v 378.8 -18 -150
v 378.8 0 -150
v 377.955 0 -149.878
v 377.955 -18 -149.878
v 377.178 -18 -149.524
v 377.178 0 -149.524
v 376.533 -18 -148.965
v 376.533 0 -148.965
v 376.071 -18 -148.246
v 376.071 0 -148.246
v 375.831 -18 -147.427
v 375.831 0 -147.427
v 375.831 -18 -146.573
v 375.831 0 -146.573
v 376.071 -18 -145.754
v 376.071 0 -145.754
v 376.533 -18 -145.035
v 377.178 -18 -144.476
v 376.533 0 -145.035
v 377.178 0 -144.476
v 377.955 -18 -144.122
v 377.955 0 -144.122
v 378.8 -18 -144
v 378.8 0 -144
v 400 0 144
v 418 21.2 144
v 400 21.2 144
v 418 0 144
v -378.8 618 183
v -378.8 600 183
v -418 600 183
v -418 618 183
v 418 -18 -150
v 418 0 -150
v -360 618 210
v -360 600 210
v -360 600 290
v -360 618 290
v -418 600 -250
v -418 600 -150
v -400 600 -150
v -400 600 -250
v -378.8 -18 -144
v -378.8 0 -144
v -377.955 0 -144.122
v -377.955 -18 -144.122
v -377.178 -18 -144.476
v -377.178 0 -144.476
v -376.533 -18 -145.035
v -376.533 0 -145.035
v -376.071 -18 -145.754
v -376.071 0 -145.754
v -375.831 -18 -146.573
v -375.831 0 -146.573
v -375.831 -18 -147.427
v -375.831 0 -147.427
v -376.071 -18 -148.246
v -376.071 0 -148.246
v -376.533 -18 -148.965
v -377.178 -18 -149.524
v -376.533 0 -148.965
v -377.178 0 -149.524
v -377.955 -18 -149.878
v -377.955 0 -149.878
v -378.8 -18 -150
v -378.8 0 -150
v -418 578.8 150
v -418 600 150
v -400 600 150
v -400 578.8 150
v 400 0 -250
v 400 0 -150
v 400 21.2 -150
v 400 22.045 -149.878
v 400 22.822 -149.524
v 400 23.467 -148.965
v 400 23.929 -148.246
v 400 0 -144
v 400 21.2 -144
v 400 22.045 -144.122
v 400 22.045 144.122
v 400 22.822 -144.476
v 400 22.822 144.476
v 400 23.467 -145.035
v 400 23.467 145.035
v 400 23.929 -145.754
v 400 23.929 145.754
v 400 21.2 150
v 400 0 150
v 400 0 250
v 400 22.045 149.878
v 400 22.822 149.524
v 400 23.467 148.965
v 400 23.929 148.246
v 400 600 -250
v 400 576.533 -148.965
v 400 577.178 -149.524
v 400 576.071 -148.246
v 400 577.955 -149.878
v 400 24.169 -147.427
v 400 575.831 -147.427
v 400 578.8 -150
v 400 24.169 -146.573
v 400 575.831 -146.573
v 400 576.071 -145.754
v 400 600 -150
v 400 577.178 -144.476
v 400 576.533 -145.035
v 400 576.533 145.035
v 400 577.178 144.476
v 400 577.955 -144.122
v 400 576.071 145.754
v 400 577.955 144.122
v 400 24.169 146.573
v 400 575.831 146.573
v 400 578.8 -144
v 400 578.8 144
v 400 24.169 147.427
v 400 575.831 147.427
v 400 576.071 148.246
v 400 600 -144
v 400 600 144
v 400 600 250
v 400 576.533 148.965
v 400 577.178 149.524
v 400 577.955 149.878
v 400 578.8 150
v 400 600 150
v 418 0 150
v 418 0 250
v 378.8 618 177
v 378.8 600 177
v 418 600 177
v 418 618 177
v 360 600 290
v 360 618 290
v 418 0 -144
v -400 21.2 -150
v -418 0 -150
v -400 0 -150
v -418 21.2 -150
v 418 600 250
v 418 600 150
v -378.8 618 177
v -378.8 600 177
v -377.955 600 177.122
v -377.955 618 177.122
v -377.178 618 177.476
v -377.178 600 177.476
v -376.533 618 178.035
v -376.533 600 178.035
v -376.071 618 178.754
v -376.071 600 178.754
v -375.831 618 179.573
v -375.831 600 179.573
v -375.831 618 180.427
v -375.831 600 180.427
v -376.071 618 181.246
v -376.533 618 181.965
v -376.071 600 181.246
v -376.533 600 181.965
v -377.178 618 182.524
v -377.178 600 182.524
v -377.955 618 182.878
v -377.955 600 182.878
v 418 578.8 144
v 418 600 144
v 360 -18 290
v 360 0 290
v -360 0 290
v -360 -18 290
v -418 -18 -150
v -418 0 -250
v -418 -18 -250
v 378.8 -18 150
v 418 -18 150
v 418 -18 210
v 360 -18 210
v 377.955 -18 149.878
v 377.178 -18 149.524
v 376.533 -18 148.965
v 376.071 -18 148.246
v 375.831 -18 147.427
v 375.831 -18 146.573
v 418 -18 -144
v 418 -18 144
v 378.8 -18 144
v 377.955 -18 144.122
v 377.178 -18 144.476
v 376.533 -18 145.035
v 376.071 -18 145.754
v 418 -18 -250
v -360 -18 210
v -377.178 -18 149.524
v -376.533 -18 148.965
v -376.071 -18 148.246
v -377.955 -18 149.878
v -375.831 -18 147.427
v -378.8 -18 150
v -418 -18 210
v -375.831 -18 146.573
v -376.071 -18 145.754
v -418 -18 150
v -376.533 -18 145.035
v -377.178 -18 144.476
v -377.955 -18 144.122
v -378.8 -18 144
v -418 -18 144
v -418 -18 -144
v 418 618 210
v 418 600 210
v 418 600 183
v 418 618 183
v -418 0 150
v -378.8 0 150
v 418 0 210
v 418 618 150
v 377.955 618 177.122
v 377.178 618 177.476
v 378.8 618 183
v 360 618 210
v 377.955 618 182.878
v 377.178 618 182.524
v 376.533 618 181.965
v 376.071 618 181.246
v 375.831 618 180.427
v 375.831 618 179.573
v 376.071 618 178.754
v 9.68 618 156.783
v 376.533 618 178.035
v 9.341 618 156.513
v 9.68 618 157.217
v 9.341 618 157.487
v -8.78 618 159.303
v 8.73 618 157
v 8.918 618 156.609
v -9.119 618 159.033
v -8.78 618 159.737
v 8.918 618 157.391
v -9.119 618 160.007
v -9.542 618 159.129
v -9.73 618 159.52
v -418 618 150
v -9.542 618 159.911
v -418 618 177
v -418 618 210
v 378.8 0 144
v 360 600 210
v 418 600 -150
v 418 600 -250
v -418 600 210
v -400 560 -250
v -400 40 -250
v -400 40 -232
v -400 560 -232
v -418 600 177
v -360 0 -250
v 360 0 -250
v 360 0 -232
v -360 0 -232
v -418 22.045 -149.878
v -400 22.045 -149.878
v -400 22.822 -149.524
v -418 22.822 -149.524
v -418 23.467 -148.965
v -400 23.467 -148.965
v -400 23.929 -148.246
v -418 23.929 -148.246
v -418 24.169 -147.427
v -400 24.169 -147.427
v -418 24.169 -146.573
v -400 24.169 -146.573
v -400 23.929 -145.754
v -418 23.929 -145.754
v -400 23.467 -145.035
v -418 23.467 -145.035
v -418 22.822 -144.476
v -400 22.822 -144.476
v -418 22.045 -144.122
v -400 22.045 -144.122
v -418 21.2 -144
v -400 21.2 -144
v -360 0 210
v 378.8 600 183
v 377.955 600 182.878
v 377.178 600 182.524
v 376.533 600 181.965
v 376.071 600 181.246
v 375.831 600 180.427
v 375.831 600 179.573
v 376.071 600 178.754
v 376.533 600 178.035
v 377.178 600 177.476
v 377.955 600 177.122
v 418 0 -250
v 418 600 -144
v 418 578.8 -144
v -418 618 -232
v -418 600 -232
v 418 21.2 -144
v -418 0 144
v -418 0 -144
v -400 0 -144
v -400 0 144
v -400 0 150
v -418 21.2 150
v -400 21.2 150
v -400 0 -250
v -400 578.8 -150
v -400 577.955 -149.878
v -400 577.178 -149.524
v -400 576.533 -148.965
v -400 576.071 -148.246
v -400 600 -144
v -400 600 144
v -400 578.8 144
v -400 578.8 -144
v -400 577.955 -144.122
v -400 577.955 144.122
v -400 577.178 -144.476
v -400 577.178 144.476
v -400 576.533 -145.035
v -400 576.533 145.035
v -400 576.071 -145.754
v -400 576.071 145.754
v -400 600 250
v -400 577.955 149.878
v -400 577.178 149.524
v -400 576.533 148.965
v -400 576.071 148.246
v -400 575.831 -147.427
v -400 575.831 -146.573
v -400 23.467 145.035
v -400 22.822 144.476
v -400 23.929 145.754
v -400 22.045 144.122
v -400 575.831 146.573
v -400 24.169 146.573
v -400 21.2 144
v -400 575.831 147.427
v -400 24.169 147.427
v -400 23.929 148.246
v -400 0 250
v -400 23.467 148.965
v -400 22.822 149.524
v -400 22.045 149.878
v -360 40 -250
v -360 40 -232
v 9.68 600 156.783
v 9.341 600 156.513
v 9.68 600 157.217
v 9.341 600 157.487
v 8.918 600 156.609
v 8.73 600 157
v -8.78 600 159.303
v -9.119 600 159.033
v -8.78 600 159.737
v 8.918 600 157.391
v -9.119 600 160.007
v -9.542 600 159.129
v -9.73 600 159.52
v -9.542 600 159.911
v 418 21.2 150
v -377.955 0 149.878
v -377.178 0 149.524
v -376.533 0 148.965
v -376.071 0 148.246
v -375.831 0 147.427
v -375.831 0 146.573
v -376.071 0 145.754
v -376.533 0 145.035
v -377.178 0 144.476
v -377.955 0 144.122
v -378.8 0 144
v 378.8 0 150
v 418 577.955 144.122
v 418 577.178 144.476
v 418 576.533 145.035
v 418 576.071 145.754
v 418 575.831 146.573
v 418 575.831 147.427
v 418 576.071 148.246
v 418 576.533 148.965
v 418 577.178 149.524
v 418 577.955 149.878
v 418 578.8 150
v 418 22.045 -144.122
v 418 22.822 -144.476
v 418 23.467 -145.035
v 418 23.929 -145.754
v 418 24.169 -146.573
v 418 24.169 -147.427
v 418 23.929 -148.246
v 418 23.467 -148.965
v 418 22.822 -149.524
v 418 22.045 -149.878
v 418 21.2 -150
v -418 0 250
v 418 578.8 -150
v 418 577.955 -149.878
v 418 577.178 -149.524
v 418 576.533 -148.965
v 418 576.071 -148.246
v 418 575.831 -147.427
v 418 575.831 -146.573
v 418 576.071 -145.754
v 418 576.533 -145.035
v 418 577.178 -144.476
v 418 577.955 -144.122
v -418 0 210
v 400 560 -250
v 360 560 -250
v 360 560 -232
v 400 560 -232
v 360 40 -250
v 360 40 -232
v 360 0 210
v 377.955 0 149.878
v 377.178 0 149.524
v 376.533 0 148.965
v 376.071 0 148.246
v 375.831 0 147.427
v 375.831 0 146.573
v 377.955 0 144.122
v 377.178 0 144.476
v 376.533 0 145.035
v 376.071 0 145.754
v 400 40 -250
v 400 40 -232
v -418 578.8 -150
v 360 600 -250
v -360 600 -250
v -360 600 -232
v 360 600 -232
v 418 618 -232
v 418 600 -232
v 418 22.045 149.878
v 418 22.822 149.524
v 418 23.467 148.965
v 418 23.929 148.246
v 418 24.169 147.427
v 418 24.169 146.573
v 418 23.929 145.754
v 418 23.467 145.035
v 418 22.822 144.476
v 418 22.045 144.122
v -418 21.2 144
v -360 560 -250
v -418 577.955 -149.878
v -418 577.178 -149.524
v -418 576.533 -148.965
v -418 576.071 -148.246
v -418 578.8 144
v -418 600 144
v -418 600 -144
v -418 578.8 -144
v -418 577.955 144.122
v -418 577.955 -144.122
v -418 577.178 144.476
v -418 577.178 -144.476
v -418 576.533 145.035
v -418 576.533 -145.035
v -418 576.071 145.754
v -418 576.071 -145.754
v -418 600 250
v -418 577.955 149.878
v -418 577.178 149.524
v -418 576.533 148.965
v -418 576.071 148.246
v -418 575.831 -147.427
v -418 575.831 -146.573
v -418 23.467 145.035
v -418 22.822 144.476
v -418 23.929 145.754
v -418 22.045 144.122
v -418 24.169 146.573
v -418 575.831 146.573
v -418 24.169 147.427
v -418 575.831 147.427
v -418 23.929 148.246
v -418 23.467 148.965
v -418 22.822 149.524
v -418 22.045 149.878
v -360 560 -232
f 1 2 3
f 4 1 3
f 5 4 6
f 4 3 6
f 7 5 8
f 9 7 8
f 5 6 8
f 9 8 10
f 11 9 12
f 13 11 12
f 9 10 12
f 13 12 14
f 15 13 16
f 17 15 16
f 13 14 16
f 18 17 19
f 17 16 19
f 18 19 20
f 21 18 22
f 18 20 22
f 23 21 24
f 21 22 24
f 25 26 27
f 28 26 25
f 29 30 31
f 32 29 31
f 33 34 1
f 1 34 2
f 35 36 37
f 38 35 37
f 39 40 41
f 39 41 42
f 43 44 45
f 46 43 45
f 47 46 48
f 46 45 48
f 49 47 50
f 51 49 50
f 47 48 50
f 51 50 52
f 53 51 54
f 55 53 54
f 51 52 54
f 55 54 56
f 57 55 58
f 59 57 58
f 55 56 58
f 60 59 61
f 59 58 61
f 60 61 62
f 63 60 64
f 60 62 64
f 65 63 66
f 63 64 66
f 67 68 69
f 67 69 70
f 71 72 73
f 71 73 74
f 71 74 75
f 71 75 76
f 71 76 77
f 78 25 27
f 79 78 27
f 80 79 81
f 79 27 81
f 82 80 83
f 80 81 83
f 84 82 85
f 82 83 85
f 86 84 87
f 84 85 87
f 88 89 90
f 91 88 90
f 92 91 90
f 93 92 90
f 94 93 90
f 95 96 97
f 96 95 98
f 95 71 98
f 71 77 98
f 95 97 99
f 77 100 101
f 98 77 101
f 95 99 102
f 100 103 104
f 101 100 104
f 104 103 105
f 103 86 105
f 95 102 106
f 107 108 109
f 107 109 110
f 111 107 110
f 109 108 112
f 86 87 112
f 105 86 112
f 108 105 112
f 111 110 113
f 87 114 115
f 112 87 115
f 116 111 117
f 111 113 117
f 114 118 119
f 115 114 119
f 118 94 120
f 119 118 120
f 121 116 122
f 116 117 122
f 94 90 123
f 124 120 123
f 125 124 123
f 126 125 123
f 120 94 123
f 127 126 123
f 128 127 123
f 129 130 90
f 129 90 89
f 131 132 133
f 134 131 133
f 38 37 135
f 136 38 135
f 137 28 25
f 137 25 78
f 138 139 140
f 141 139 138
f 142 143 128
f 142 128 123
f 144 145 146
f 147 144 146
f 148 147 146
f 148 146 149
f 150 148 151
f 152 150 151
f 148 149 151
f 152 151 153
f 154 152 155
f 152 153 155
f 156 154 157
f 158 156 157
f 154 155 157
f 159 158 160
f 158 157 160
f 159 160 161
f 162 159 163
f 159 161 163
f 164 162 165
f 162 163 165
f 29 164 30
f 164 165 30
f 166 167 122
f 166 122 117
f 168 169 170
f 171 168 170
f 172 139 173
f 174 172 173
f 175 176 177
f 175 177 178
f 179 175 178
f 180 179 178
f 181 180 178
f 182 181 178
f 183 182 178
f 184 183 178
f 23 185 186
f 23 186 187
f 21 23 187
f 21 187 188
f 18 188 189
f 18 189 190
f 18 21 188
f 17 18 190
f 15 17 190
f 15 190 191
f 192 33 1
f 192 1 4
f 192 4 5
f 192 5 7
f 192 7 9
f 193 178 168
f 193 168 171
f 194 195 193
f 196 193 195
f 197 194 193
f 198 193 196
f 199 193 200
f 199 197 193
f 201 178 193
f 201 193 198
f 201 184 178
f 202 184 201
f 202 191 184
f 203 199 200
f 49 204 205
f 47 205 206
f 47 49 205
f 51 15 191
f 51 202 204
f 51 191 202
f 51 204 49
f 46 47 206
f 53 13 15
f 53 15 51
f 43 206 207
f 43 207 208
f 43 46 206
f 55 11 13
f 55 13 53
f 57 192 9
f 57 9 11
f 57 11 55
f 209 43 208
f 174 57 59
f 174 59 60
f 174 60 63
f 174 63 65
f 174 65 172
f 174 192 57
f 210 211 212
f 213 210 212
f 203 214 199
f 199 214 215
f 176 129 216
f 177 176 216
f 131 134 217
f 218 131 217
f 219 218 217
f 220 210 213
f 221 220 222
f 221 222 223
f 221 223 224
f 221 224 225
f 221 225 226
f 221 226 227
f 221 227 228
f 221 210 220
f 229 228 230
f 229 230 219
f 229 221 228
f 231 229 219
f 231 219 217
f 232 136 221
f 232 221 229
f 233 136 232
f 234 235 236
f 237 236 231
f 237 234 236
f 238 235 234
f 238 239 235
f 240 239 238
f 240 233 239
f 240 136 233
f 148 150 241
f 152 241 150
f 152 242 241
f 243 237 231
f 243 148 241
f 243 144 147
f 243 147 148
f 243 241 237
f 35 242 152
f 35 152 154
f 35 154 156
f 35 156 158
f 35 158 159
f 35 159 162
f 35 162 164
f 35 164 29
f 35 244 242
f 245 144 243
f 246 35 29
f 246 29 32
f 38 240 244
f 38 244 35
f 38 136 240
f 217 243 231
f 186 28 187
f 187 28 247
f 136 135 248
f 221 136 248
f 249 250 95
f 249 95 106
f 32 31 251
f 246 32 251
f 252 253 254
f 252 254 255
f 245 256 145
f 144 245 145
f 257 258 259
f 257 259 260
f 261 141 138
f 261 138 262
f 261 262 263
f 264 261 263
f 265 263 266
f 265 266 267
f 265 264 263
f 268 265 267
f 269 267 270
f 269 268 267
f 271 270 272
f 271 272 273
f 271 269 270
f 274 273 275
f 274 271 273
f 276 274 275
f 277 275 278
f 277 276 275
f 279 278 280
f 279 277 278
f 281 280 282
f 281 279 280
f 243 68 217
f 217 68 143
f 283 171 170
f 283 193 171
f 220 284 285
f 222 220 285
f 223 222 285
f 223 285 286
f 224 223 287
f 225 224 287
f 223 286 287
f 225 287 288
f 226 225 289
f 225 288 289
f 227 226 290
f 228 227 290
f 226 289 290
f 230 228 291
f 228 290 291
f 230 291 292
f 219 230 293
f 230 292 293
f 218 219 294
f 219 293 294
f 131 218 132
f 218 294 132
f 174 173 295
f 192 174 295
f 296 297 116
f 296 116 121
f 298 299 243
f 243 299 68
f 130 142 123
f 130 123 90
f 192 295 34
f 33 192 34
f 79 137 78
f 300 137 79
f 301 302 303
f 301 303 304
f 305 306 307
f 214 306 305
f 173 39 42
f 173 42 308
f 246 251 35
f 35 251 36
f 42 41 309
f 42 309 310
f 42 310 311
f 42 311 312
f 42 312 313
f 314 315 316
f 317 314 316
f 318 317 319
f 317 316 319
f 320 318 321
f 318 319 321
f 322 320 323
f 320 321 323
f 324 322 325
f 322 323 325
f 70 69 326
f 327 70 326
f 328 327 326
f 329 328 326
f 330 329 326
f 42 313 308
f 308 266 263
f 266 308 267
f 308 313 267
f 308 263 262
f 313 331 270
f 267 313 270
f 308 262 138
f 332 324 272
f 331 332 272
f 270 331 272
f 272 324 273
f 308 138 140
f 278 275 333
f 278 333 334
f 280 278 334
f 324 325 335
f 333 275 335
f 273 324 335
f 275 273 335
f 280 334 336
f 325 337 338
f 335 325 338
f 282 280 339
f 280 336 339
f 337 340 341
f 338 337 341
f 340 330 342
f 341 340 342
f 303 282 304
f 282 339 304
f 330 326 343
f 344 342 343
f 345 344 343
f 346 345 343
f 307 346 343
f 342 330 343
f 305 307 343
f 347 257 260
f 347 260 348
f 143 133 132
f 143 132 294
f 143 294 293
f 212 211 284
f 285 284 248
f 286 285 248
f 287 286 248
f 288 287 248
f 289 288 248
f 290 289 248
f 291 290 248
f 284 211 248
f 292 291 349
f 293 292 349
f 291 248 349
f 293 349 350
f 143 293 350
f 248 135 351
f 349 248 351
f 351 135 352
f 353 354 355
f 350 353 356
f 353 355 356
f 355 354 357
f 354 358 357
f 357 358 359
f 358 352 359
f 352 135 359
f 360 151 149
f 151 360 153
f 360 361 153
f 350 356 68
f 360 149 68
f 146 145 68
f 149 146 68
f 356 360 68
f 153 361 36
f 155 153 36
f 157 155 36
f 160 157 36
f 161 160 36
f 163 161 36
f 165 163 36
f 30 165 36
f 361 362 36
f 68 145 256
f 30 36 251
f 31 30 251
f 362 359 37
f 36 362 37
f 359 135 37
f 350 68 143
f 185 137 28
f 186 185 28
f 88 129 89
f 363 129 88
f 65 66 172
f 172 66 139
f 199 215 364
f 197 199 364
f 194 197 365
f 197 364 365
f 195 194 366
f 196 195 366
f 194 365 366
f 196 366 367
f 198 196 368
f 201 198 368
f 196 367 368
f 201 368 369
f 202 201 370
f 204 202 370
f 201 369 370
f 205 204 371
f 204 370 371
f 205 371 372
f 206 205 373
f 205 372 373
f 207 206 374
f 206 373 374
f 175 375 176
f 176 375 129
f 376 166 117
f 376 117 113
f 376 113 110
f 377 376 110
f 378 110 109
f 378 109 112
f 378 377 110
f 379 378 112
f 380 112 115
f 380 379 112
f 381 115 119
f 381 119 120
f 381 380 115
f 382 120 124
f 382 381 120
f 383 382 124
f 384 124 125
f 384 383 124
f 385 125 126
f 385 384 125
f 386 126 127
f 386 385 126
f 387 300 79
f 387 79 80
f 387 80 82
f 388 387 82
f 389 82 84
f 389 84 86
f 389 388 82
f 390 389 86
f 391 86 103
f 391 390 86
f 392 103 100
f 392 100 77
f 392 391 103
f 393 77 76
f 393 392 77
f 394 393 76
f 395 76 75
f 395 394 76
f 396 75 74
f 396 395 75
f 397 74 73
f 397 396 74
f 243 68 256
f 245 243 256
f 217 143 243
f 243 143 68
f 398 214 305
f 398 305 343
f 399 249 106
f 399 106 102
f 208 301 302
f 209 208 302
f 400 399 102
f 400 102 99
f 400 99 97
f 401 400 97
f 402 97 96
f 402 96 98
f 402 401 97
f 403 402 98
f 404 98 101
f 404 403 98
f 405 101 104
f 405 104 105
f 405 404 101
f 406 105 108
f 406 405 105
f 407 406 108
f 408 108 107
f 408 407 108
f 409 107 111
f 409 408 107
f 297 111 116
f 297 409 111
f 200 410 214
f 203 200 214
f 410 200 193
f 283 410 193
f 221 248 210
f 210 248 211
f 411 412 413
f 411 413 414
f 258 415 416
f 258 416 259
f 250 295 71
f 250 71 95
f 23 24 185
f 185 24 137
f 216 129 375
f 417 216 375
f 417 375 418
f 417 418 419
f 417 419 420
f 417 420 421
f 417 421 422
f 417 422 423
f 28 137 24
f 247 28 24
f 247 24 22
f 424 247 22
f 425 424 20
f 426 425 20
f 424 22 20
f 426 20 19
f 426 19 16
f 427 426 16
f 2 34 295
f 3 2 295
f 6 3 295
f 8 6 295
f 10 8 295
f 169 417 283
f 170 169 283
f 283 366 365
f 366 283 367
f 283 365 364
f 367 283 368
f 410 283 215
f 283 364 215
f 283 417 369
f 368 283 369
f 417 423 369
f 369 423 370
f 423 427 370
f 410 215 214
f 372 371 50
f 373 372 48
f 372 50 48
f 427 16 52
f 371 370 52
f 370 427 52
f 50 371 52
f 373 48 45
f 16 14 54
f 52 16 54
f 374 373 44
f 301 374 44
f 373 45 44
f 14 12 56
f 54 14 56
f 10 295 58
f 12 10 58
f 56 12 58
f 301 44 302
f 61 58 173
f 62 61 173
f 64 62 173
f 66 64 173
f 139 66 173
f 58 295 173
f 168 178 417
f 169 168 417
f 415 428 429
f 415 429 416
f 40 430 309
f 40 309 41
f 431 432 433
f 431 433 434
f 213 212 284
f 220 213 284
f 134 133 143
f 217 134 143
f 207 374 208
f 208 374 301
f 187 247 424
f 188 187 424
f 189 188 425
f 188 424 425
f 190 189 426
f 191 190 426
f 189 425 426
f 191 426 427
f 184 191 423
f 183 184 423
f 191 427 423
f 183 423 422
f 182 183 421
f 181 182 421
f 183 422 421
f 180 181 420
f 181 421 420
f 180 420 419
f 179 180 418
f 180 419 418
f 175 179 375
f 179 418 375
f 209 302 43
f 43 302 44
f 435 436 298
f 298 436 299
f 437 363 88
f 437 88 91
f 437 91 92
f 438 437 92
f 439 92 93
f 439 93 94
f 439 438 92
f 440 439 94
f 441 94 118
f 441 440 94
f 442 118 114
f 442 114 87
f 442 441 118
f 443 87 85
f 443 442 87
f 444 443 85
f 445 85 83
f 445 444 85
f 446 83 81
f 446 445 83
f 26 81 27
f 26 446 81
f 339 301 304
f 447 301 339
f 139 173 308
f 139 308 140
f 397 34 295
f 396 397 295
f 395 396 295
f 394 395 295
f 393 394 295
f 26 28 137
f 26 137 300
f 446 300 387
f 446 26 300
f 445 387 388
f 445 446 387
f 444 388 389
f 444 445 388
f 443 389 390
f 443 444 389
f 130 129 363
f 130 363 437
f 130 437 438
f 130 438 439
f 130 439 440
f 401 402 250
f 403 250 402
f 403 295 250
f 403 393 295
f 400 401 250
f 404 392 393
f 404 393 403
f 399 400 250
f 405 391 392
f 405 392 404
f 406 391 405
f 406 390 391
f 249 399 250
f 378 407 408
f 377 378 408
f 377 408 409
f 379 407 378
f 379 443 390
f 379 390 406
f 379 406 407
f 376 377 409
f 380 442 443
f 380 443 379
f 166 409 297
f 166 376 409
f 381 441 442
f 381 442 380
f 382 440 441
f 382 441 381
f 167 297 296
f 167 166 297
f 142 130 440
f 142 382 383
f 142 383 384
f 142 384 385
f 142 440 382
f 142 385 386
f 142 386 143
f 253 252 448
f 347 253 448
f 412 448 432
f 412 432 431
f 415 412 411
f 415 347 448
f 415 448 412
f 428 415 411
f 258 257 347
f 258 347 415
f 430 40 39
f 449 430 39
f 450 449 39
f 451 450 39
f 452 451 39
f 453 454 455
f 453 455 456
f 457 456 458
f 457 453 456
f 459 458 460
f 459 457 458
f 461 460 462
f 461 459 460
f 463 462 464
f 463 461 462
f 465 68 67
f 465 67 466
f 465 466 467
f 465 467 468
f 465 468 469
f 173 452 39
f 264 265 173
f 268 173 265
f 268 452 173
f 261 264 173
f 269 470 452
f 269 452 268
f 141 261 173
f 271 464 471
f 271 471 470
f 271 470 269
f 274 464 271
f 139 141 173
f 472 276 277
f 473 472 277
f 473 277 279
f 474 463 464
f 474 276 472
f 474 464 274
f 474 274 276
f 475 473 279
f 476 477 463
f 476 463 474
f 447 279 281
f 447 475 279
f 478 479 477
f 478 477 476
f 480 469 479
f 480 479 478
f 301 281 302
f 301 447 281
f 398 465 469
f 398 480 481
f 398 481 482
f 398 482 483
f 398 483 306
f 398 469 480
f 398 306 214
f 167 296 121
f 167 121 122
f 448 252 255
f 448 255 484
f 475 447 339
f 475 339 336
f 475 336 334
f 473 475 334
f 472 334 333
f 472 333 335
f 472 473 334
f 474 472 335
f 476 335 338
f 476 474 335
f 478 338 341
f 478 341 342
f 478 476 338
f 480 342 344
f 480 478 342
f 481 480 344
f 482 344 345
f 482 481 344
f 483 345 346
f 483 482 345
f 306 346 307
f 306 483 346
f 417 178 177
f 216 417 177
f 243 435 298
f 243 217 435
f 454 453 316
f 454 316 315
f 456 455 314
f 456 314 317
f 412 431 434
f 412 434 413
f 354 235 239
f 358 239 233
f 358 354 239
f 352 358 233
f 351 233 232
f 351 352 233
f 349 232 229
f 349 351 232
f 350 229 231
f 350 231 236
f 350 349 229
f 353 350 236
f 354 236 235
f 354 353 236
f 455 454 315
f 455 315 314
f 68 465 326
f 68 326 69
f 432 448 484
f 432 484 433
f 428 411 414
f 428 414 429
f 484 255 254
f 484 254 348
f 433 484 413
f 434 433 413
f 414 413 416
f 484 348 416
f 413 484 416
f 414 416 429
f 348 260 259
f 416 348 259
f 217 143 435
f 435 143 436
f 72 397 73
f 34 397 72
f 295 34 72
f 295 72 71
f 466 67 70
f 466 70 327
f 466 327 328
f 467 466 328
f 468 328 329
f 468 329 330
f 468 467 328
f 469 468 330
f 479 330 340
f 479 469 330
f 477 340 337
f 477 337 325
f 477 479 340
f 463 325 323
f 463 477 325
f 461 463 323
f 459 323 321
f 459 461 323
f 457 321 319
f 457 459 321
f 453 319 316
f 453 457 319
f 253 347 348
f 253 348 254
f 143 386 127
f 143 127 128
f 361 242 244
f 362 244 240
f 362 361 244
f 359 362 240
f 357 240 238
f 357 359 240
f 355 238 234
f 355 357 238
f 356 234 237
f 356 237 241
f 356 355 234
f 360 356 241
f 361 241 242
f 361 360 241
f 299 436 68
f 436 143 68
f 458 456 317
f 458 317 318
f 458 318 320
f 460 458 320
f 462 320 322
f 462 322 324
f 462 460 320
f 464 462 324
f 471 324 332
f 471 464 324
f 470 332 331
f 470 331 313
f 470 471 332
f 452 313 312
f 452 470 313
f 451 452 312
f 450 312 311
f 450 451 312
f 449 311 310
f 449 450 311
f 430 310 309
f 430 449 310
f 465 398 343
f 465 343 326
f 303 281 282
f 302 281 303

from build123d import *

# Parameters (mm, degrees)
F1_DEPTH  = 18
F3_DEPTH  = 18
F5_DEPTH  = 18
F6_W      = 58
F6_H      = 40
F7_DEPTH  = 25
F8_DEPTH  = 40
F10_DEPTH = 18
F11_R     = 0.5
F12_DEPTH = 18
F11_W     = 18
F11_H     = 288
F13_DEPTH = 18


with BuildPart() as f1:
    # F0 (on Front) → F1 (new body)
    with BuildSketch(Plane.XZ):
        with BuildLine():
            Line((-418, -250), (418, -250))
            Line((418, -250), (418, -150))
            Line((418, -150), (378.8, -150))
            ThreePointArc((378.8, -150), (375.8, -147), (378.8, -144))
            Line((378.8, -144), (418, -144))
            Line((418, -144), (418, 144))
            Line((418, 144), (378.8, 144))
            ThreePointArc((378.8, 144), (375.8, 147), (378.8, 150))
            Line((378.8, 150), (418, 150))
            Line((418, 150), (418, 250))
            Line((418, 250), (-418, 250))
            Line((-418, 250), (-418, 150))
            Line((-418, 150), (-378.8, 150))
            ThreePointArc((-378.8, 150), (-375.8, 147), (-378.8, 144))
            Line((-378.8, 144), (-418, 144))
            Line((-418, 144), (-418, -144))
            Line((-418, -144), (-378.8, -144))
            ThreePointArc((-378.8, -144), (-375.8, -147), (-378.8, -150))
            Line((-378.8, -150), (-418, -150))
            Line((-418, -150), (-418, -250))
        make_face()
    extrude(amount=F1_DEPTH)

    # F6 (on face) → F7 (cut)
    with BuildSketch(Plane.XZ.offset(18)):
        with Locations((-389, 230)):
            Rectangle(F6_W, F6_H)
        with Locations((389, 230)):
            Rectangle(F6_W, F6_H)
    extrude(amount=-F7_DEPTH, mode=Mode.SUBTRACT)

    # F8 (add): a face of the model
    f8_faces = [f1.faces().sort_by_distance(p)[0] for p in [
        (0, -9, 250),
    ]]
    extrude(f8_faces, amount=F8_DEPTH)


with BuildPart() as f3:
    # F2 (on face) → F3 (new body)
    with BuildSketch(Plane.YZ.offset(418)):
        with BuildLine():
            Line((600, 250), (0, 250))
            Line((0, 250), (0, 150))
            Line((0, 150), (21.2, 150))
            ThreePointArc((21.2, 150), (24.2, 147), (21.2, 144))
            Line((21.2, 144), (0, 144))
            Line((0, 144), (0, -144))
            Line((0, -144), (21.2, -144))
            ThreePointArc((21.2, -144), (24.2, -147), (21.2, -150))
            Line((21.2, -150), (0, -150))
            Line((0, -150), (0, -250))
            Line((0, -250), (600, -250))
            Line((600, -250), (600, -150))
            Line((600, -150), (578.8, -150))
            ThreePointArc((578.8, -150), (575.8, -147), (578.8, -144))
            Line((578.8, -144), (600, -144))
            Line((600, -144), (600, 144))
            Line((600, 144), (578.8, 144))
            ThreePointArc((578.8, 144), (575.8, 147), (578.8, 150))
            Line((578.8, 150), (600, 150))
            Line((600, 150), (600, 250))
        make_face()
    extrude(amount=-F3_DEPTH)


with BuildPart() as f5:
    # F4 (on face) → F5 (new body)
    with BuildSketch(Plane(origin=(-418, 0, 0), x_dir=(0, -1, 0), z_dir=(-1, 0, 0))):
        with BuildLine():
            Line((0, 150), (0, 250))
            Line((0, 250), (-600, 250))
            Line((-600, 250), (-600, 150))
            Line((-600, 150), (-578.8, 150))
            ThreePointArc((-578.8, 150), (-575.8, 147), (-578.8, 144))
            Line((-578.8, 144), (-600, 144))
            Line((-600, 144), (-600, -144))
            Line((-600, -144), (-578.8, -144))
            ThreePointArc((-578.8, -144), (-575.8, -147), (-578.8, -150))
            Line((-578.8, -150), (-600, -150))
            Line((-600, -150), (-600, -250))
            Line((-600, -250), (0, -250))
            Line((0, -250), (0, -150))
            Line((0, -150), (-21.2, -150))
            ThreePointArc((-21.2, -150), (-24.2, -147), (-21.2, -144))
            Line((-21.2, -144), (0, -144))
            Line((0, -144), (0, 144))
            Line((0, 144), (-21.2, 144))
            ThreePointArc((-21.2, 144), (-24.2, 147), (-21.2, 150))
            Line((-21.2, 150), (0, 150))
        make_face()
    extrude(amount=-F5_DEPTH)


with BuildPart() as f10:
    # F9 (on face) → F10 (new body)
    with BuildSketch(Plane(origin=(0, 0, -250), x_dir=(1, 0, 0), z_dir=(0, 0, -1))):
        Polygon((-400, -40), (-400, -560), (-360, -560), (-360, -600), (360, -600), (360, -560), (400, -560), (400, -40), (360, -40), (360, 0), (-360, 0), (-360, -40), align=None)
    extrude(amount=-F10_DEPTH)


with BuildPart() as f12:
    # F11 (on face) → F12 (new body)
    with BuildSketch(Plane(origin=(0, 600, 0), x_dir=(-1, 0, 0), z_dir=(0, 1, 0))):
        with BuildLine():
            Line((360, 290), (-360, 290))
            Line((-360, 290), (-360, 210))
            Line((-360, 210), (-418, 210))
            Line((-418, 210), (-418, 183))
            Line((-418, 183), (-378.8, 183))
            ThreePointArc((-378.8, 183), (-375.8, 180), (-378.8, 177))
            Line((-378.8, 177), (-418, 177))
            Line((-418, 177), (-418, 150))
            Line((-418, 150), (-16.23, 150))
            Line((-16.23, 150), (16.23, 150))
            Line((16.23, 150), (418, 150))
            Line((418, 150), (418, 177))
            Line((418, 177), (378.8, 177))
            ThreePointArc((378.8, 177), (375.8, 180), (378.8, 183))
            Line((378.8, 183), (418, 183))
            Line((418, 183), (418, 210))
            Line((418, 210), (360, 210))
            Line((360, 210), (360, 290))
        make_face()
        with Locations((-9.23, 157)):
            Circle(F11_R, mode=Mode.SUBTRACT)
        with Locations((9.23, 159.52)):
            Circle(F11_R, mode=Mode.SUBTRACT)
    extrude(amount=F12_DEPTH)


with BuildPart() as f13:
    # F11 (on face) → F13 (new body)
    with BuildSketch(Plane(origin=(0, 600, 0), x_dir=(-1, 0, 0), z_dir=(0, 1, 0))):
        with Locations((-409, 0)):
            Rectangle(F11_W, F11_H)
        Polygon((-16.23, 150), (-418, 150), (-418, 144), (-400, 144), (-400, -144), (-418, -144), (-418, -232), (418, -232), (418, 150), (16.23, 150), align=None)
    extrude(amount=F13_DEPTH)


solid = Compound([f1.part, f3.part, f5.part, f10.part, f12.part, f13.part])
